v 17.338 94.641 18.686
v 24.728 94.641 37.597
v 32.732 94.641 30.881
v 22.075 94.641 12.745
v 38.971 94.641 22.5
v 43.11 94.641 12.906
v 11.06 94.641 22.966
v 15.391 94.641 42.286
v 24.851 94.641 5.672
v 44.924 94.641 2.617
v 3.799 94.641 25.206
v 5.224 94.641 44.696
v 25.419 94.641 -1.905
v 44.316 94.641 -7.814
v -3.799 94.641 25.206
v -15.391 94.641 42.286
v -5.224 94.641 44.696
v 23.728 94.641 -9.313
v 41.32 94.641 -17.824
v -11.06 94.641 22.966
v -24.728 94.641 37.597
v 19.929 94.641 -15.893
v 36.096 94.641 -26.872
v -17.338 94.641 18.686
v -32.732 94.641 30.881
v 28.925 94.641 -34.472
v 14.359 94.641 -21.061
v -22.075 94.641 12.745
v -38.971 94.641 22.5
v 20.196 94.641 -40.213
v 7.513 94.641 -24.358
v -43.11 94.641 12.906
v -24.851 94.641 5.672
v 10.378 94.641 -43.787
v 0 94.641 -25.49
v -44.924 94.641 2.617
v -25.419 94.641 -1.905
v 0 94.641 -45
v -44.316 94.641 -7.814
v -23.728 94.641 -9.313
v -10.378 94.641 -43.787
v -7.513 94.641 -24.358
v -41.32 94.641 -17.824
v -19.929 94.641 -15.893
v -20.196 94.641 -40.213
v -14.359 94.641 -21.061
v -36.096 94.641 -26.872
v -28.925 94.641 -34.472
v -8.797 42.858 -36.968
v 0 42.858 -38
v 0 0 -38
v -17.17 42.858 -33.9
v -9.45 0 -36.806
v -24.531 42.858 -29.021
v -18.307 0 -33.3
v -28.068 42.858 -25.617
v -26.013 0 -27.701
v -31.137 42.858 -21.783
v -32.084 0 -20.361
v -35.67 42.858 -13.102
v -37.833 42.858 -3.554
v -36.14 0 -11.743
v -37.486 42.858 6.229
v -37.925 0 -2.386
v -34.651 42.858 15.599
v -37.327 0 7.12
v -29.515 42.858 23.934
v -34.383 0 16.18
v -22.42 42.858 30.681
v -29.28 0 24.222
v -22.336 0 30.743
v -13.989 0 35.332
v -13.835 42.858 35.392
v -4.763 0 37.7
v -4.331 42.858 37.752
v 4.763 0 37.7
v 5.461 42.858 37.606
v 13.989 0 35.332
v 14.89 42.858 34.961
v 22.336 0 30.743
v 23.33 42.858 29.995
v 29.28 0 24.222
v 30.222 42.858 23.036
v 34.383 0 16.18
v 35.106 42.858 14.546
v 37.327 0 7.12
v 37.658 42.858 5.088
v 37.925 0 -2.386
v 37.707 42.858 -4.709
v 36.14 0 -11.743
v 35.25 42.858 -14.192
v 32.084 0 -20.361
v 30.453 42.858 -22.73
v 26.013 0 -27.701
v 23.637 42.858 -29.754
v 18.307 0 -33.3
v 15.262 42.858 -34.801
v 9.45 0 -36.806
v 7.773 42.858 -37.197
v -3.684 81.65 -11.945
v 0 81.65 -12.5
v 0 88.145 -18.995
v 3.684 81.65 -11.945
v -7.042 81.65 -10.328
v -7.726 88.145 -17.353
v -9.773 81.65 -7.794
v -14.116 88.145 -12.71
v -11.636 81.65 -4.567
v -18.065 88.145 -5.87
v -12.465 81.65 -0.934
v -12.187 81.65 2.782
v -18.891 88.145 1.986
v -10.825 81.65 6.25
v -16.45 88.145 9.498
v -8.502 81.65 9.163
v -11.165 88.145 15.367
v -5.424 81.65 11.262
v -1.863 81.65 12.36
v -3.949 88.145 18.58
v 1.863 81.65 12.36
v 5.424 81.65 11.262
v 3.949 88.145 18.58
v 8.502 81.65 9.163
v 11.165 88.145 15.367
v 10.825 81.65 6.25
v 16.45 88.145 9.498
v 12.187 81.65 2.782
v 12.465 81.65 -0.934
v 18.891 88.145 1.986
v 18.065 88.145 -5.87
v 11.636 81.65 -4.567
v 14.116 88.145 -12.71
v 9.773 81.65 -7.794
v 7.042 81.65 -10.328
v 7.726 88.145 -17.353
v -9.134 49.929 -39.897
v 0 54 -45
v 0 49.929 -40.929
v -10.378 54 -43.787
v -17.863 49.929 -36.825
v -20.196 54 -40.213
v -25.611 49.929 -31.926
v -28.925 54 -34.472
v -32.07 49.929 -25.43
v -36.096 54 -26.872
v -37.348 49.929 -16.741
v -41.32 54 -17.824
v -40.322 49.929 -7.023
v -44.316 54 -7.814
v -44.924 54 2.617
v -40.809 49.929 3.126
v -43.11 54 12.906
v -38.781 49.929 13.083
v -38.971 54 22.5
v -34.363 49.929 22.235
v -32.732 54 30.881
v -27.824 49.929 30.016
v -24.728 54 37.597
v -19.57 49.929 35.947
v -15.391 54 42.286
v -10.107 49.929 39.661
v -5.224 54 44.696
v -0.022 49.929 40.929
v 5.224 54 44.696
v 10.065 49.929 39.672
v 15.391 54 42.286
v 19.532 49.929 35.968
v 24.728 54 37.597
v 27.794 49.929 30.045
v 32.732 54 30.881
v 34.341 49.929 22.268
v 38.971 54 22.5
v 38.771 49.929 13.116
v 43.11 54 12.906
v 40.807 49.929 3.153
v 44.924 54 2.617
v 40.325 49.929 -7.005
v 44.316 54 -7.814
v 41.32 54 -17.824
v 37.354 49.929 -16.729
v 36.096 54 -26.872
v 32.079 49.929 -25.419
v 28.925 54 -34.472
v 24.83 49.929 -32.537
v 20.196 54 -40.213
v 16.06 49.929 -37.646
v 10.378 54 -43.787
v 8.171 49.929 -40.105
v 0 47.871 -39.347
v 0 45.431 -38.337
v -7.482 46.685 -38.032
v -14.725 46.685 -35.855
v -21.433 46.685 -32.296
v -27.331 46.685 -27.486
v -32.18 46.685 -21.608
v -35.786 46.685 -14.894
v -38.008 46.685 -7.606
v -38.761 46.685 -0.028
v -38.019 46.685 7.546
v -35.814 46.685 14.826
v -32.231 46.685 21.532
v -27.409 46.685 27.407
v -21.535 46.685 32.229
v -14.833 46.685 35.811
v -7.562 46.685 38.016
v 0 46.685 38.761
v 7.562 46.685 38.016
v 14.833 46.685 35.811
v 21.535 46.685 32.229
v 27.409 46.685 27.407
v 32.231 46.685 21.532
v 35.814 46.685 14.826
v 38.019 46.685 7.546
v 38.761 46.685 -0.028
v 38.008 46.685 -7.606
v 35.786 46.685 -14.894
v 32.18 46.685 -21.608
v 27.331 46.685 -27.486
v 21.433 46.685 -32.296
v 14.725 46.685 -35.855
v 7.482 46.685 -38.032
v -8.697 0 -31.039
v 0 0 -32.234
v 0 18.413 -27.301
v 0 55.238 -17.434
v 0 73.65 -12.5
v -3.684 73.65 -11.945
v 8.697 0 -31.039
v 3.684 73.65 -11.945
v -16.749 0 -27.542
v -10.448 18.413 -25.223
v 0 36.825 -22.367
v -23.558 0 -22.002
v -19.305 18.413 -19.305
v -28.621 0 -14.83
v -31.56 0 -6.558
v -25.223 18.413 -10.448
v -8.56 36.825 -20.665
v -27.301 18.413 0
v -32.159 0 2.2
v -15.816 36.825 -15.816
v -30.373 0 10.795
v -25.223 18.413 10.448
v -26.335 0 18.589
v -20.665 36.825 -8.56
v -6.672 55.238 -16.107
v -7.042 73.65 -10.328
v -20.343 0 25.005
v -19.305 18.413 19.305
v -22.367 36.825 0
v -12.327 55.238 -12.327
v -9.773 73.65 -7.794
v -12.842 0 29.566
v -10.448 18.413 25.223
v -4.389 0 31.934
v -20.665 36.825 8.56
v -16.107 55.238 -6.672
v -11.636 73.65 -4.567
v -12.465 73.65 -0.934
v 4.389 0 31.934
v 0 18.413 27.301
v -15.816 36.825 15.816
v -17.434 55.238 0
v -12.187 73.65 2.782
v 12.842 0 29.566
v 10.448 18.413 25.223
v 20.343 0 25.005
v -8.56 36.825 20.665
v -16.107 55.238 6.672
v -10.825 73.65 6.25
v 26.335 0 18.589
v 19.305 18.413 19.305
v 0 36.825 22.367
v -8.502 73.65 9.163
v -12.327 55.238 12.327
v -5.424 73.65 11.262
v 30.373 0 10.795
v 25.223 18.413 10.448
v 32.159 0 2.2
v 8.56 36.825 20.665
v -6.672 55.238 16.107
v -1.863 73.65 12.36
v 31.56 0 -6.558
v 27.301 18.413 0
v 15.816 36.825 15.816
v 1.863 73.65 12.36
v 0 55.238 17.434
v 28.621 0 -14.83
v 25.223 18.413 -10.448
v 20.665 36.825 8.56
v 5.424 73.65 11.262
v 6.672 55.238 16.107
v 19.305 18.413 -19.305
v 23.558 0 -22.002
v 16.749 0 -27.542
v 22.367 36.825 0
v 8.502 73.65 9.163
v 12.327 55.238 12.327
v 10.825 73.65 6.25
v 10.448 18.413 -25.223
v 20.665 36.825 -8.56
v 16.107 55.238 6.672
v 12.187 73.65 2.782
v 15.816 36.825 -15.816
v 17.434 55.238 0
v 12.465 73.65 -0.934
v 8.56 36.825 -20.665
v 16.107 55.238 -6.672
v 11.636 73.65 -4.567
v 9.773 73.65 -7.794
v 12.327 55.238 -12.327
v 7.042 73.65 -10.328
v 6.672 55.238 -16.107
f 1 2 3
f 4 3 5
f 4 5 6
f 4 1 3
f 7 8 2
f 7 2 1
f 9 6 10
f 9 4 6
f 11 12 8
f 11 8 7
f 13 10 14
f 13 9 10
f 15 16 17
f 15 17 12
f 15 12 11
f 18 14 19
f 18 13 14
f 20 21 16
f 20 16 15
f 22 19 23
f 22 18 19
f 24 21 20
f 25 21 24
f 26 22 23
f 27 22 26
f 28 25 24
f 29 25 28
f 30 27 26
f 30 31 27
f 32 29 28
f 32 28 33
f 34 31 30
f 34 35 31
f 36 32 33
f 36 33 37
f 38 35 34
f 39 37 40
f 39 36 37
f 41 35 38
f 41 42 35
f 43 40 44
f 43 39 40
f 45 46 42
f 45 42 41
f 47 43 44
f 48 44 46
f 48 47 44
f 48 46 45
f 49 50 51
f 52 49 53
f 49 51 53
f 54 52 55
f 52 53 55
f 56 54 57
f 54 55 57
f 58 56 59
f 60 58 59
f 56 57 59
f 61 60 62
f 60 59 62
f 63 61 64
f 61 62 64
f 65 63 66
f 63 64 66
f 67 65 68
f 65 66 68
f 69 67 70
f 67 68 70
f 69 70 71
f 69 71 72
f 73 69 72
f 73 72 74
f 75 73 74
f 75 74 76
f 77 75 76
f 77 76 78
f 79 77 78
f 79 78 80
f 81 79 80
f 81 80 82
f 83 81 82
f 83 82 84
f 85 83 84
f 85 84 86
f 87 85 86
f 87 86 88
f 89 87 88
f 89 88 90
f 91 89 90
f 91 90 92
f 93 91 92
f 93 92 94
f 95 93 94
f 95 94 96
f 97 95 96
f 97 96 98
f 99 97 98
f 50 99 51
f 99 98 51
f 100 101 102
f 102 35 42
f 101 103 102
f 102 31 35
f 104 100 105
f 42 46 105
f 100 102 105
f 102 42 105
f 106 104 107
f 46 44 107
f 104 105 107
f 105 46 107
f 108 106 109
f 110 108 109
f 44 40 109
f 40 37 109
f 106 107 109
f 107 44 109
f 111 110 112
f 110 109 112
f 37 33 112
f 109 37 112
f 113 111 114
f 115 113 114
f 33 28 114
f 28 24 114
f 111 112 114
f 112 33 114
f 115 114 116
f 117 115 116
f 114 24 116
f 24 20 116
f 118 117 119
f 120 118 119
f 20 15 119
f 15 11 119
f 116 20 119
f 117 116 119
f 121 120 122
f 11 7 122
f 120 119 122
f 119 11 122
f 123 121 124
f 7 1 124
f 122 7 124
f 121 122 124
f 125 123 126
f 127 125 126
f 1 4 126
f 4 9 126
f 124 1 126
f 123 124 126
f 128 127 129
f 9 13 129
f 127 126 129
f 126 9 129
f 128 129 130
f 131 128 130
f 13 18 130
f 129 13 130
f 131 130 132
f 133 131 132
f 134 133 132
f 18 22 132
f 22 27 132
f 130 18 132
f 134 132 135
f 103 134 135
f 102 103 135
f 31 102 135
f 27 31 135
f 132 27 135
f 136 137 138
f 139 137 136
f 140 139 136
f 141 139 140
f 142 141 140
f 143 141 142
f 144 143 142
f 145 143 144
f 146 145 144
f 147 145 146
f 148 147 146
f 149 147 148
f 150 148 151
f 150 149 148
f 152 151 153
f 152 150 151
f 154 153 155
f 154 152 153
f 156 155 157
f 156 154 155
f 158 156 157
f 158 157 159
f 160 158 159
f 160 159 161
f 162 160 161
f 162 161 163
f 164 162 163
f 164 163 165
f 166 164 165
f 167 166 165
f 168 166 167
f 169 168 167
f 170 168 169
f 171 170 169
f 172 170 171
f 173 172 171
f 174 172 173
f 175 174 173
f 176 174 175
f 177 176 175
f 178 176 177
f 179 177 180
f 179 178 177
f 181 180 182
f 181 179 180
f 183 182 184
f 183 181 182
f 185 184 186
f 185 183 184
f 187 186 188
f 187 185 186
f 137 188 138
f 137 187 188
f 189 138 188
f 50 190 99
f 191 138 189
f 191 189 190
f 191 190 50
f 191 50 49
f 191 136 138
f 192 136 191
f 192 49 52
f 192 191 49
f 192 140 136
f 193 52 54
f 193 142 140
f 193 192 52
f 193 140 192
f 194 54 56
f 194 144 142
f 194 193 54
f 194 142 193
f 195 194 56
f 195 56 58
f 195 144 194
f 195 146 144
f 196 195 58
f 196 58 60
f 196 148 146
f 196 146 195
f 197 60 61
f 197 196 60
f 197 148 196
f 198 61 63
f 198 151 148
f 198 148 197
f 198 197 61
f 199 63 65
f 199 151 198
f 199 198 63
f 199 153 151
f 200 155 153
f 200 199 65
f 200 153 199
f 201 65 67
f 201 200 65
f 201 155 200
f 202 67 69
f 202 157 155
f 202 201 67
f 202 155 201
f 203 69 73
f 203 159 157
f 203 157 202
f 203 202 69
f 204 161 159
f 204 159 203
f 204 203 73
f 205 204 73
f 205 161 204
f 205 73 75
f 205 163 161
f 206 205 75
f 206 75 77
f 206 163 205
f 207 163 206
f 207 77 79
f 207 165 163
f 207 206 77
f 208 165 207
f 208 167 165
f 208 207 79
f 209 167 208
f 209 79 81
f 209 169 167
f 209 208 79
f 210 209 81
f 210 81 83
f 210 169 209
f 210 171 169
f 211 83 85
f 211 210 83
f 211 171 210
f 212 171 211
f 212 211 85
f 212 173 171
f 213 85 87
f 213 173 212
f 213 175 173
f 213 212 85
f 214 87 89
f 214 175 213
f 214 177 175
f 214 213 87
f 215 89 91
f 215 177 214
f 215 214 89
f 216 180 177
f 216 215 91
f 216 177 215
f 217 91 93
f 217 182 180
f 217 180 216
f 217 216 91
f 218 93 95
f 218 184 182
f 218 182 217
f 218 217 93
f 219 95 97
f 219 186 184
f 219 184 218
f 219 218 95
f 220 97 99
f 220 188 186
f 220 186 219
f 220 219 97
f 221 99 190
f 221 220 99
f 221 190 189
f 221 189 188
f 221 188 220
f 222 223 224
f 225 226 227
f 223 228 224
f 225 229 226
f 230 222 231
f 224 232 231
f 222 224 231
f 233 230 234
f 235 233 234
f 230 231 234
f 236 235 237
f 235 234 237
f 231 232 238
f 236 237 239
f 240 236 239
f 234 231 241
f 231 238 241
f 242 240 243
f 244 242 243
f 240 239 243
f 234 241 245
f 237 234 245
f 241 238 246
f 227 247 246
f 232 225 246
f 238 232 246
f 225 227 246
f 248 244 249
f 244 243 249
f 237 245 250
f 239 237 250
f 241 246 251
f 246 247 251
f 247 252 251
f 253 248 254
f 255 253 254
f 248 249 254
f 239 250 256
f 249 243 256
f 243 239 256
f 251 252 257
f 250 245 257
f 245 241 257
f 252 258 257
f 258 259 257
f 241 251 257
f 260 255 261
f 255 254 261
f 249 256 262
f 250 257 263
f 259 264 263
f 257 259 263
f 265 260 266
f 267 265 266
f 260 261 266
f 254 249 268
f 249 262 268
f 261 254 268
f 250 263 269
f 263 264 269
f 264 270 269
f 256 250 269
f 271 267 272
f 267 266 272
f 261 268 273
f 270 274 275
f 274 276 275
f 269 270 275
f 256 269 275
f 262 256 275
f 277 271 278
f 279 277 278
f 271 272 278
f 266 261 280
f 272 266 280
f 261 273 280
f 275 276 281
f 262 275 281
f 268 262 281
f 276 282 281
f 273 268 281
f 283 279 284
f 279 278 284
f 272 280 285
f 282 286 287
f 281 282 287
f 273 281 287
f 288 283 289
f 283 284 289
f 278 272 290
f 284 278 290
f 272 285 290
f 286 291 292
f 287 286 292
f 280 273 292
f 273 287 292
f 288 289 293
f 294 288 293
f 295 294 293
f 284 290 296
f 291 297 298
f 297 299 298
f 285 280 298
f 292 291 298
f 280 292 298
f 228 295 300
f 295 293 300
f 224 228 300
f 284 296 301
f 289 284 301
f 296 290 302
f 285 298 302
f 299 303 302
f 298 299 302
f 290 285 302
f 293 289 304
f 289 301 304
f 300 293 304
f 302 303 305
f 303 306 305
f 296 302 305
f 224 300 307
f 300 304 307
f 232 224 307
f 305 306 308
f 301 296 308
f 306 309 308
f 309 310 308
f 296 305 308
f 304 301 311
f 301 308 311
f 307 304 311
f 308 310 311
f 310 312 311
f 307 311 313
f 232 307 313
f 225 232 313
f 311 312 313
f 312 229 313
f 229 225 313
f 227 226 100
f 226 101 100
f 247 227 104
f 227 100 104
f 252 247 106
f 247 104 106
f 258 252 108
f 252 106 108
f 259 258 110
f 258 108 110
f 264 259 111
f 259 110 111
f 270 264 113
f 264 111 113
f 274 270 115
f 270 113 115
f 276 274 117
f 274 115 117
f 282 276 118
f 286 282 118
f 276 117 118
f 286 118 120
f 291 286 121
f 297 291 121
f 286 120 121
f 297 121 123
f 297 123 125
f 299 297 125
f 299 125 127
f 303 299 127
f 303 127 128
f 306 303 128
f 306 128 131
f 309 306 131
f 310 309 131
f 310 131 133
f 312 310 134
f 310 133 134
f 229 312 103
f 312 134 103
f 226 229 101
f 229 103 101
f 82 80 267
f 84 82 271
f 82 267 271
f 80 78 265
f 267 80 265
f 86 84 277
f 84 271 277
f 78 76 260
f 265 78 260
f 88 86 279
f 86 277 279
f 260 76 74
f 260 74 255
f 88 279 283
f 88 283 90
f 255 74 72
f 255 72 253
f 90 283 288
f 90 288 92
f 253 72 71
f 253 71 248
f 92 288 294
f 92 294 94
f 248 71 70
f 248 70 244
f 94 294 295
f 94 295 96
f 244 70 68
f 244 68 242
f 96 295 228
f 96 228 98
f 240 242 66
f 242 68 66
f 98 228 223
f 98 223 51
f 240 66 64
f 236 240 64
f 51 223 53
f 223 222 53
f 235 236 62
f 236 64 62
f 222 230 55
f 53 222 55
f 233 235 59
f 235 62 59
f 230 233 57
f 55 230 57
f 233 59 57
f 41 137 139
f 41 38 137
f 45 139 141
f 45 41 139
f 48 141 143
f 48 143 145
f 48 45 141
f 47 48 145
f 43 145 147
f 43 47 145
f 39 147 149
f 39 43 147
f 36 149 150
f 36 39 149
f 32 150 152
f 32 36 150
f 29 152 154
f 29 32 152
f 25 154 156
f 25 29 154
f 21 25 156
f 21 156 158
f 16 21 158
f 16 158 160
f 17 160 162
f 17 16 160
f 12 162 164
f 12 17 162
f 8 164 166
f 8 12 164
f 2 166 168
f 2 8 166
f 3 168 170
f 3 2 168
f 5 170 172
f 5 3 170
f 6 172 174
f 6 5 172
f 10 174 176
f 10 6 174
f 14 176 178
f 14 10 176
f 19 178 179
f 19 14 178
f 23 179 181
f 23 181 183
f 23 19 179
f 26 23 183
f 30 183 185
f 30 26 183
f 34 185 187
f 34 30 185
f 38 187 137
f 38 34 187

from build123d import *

# Parameters (mm, degrees)
SCHIZZO4_W  = 25
SCHIZZO4_H  = 30
SCHIZZO5_W  = 7
SCHIZZO5_H  = 40.640509339
RACCORDO1_R = 10


with BuildPart() as part:
    # Schizzo1 → Rivoluzione1 (revolve)
    with BuildSketch(Plane.XY, mode=Mode.PRIVATE) as rivoluzione1_sk:
        Polygon((-32.234492396, 0), (-12.5, 73.650128282), (-12.5, 81.650128282), (-25.490381057, 94.640509339), (-63, 94.640509339), (-38, 64.640509339), (-38, 0), align=None)
    revolve(rivoluzione1_sk.sketch.rotate(Axis((0, 0, 0), (0, 1, 0)), 270), axis=Axis((0, 0, 0), (0, 1, 0)))

    # Schizzo4 → Taglia-Rivoluzione3 (revolve, cut)
    with BuildSketch(Plane.XY, mode=Mode.PRIVATE) as taglia_rivoluzione3_sk:
        with Locations((-50.5, 79.640509339)):
            Rectangle(SCHIZZO4_W, SCHIZZO4_H)
    revolve(taglia_rivoluzione3_sk.sketch.rotate(Axis((0, 0, 0), (0, 1, 0)), 270), axis=Axis((0, 0, 0), (0, 1, 0)), mode=Mode.SUBTRACT)

    # Schizzo5 → Rivoluzione2 (revolve)
    with BuildSketch(Plane.XY, mode=Mode.PRIVATE) as rivoluzione2_sk:
        with Locations((-41.5, 74.32025467)):
            Rectangle(SCHIZZO5_W, SCHIZZO5_H)
        Polygon((-38, 54), (-38, 47), (-45, 54), align=None)
    revolve(rivoluzione2_sk.sketch.rotate(Axis((0, 0, 0), (0, 1, 0)), 270), axis=Axis((0, 0, 0), (0, 1, 0)))

    # Raccordo1
    raccordo1_edges = [part.edges().sort_by_distance(p)[0] for p in [
        (0, 47, 38),
    ]]
    fillet(raccordo1_edges, radius=RACCORDO1_R)


solid = part.part
